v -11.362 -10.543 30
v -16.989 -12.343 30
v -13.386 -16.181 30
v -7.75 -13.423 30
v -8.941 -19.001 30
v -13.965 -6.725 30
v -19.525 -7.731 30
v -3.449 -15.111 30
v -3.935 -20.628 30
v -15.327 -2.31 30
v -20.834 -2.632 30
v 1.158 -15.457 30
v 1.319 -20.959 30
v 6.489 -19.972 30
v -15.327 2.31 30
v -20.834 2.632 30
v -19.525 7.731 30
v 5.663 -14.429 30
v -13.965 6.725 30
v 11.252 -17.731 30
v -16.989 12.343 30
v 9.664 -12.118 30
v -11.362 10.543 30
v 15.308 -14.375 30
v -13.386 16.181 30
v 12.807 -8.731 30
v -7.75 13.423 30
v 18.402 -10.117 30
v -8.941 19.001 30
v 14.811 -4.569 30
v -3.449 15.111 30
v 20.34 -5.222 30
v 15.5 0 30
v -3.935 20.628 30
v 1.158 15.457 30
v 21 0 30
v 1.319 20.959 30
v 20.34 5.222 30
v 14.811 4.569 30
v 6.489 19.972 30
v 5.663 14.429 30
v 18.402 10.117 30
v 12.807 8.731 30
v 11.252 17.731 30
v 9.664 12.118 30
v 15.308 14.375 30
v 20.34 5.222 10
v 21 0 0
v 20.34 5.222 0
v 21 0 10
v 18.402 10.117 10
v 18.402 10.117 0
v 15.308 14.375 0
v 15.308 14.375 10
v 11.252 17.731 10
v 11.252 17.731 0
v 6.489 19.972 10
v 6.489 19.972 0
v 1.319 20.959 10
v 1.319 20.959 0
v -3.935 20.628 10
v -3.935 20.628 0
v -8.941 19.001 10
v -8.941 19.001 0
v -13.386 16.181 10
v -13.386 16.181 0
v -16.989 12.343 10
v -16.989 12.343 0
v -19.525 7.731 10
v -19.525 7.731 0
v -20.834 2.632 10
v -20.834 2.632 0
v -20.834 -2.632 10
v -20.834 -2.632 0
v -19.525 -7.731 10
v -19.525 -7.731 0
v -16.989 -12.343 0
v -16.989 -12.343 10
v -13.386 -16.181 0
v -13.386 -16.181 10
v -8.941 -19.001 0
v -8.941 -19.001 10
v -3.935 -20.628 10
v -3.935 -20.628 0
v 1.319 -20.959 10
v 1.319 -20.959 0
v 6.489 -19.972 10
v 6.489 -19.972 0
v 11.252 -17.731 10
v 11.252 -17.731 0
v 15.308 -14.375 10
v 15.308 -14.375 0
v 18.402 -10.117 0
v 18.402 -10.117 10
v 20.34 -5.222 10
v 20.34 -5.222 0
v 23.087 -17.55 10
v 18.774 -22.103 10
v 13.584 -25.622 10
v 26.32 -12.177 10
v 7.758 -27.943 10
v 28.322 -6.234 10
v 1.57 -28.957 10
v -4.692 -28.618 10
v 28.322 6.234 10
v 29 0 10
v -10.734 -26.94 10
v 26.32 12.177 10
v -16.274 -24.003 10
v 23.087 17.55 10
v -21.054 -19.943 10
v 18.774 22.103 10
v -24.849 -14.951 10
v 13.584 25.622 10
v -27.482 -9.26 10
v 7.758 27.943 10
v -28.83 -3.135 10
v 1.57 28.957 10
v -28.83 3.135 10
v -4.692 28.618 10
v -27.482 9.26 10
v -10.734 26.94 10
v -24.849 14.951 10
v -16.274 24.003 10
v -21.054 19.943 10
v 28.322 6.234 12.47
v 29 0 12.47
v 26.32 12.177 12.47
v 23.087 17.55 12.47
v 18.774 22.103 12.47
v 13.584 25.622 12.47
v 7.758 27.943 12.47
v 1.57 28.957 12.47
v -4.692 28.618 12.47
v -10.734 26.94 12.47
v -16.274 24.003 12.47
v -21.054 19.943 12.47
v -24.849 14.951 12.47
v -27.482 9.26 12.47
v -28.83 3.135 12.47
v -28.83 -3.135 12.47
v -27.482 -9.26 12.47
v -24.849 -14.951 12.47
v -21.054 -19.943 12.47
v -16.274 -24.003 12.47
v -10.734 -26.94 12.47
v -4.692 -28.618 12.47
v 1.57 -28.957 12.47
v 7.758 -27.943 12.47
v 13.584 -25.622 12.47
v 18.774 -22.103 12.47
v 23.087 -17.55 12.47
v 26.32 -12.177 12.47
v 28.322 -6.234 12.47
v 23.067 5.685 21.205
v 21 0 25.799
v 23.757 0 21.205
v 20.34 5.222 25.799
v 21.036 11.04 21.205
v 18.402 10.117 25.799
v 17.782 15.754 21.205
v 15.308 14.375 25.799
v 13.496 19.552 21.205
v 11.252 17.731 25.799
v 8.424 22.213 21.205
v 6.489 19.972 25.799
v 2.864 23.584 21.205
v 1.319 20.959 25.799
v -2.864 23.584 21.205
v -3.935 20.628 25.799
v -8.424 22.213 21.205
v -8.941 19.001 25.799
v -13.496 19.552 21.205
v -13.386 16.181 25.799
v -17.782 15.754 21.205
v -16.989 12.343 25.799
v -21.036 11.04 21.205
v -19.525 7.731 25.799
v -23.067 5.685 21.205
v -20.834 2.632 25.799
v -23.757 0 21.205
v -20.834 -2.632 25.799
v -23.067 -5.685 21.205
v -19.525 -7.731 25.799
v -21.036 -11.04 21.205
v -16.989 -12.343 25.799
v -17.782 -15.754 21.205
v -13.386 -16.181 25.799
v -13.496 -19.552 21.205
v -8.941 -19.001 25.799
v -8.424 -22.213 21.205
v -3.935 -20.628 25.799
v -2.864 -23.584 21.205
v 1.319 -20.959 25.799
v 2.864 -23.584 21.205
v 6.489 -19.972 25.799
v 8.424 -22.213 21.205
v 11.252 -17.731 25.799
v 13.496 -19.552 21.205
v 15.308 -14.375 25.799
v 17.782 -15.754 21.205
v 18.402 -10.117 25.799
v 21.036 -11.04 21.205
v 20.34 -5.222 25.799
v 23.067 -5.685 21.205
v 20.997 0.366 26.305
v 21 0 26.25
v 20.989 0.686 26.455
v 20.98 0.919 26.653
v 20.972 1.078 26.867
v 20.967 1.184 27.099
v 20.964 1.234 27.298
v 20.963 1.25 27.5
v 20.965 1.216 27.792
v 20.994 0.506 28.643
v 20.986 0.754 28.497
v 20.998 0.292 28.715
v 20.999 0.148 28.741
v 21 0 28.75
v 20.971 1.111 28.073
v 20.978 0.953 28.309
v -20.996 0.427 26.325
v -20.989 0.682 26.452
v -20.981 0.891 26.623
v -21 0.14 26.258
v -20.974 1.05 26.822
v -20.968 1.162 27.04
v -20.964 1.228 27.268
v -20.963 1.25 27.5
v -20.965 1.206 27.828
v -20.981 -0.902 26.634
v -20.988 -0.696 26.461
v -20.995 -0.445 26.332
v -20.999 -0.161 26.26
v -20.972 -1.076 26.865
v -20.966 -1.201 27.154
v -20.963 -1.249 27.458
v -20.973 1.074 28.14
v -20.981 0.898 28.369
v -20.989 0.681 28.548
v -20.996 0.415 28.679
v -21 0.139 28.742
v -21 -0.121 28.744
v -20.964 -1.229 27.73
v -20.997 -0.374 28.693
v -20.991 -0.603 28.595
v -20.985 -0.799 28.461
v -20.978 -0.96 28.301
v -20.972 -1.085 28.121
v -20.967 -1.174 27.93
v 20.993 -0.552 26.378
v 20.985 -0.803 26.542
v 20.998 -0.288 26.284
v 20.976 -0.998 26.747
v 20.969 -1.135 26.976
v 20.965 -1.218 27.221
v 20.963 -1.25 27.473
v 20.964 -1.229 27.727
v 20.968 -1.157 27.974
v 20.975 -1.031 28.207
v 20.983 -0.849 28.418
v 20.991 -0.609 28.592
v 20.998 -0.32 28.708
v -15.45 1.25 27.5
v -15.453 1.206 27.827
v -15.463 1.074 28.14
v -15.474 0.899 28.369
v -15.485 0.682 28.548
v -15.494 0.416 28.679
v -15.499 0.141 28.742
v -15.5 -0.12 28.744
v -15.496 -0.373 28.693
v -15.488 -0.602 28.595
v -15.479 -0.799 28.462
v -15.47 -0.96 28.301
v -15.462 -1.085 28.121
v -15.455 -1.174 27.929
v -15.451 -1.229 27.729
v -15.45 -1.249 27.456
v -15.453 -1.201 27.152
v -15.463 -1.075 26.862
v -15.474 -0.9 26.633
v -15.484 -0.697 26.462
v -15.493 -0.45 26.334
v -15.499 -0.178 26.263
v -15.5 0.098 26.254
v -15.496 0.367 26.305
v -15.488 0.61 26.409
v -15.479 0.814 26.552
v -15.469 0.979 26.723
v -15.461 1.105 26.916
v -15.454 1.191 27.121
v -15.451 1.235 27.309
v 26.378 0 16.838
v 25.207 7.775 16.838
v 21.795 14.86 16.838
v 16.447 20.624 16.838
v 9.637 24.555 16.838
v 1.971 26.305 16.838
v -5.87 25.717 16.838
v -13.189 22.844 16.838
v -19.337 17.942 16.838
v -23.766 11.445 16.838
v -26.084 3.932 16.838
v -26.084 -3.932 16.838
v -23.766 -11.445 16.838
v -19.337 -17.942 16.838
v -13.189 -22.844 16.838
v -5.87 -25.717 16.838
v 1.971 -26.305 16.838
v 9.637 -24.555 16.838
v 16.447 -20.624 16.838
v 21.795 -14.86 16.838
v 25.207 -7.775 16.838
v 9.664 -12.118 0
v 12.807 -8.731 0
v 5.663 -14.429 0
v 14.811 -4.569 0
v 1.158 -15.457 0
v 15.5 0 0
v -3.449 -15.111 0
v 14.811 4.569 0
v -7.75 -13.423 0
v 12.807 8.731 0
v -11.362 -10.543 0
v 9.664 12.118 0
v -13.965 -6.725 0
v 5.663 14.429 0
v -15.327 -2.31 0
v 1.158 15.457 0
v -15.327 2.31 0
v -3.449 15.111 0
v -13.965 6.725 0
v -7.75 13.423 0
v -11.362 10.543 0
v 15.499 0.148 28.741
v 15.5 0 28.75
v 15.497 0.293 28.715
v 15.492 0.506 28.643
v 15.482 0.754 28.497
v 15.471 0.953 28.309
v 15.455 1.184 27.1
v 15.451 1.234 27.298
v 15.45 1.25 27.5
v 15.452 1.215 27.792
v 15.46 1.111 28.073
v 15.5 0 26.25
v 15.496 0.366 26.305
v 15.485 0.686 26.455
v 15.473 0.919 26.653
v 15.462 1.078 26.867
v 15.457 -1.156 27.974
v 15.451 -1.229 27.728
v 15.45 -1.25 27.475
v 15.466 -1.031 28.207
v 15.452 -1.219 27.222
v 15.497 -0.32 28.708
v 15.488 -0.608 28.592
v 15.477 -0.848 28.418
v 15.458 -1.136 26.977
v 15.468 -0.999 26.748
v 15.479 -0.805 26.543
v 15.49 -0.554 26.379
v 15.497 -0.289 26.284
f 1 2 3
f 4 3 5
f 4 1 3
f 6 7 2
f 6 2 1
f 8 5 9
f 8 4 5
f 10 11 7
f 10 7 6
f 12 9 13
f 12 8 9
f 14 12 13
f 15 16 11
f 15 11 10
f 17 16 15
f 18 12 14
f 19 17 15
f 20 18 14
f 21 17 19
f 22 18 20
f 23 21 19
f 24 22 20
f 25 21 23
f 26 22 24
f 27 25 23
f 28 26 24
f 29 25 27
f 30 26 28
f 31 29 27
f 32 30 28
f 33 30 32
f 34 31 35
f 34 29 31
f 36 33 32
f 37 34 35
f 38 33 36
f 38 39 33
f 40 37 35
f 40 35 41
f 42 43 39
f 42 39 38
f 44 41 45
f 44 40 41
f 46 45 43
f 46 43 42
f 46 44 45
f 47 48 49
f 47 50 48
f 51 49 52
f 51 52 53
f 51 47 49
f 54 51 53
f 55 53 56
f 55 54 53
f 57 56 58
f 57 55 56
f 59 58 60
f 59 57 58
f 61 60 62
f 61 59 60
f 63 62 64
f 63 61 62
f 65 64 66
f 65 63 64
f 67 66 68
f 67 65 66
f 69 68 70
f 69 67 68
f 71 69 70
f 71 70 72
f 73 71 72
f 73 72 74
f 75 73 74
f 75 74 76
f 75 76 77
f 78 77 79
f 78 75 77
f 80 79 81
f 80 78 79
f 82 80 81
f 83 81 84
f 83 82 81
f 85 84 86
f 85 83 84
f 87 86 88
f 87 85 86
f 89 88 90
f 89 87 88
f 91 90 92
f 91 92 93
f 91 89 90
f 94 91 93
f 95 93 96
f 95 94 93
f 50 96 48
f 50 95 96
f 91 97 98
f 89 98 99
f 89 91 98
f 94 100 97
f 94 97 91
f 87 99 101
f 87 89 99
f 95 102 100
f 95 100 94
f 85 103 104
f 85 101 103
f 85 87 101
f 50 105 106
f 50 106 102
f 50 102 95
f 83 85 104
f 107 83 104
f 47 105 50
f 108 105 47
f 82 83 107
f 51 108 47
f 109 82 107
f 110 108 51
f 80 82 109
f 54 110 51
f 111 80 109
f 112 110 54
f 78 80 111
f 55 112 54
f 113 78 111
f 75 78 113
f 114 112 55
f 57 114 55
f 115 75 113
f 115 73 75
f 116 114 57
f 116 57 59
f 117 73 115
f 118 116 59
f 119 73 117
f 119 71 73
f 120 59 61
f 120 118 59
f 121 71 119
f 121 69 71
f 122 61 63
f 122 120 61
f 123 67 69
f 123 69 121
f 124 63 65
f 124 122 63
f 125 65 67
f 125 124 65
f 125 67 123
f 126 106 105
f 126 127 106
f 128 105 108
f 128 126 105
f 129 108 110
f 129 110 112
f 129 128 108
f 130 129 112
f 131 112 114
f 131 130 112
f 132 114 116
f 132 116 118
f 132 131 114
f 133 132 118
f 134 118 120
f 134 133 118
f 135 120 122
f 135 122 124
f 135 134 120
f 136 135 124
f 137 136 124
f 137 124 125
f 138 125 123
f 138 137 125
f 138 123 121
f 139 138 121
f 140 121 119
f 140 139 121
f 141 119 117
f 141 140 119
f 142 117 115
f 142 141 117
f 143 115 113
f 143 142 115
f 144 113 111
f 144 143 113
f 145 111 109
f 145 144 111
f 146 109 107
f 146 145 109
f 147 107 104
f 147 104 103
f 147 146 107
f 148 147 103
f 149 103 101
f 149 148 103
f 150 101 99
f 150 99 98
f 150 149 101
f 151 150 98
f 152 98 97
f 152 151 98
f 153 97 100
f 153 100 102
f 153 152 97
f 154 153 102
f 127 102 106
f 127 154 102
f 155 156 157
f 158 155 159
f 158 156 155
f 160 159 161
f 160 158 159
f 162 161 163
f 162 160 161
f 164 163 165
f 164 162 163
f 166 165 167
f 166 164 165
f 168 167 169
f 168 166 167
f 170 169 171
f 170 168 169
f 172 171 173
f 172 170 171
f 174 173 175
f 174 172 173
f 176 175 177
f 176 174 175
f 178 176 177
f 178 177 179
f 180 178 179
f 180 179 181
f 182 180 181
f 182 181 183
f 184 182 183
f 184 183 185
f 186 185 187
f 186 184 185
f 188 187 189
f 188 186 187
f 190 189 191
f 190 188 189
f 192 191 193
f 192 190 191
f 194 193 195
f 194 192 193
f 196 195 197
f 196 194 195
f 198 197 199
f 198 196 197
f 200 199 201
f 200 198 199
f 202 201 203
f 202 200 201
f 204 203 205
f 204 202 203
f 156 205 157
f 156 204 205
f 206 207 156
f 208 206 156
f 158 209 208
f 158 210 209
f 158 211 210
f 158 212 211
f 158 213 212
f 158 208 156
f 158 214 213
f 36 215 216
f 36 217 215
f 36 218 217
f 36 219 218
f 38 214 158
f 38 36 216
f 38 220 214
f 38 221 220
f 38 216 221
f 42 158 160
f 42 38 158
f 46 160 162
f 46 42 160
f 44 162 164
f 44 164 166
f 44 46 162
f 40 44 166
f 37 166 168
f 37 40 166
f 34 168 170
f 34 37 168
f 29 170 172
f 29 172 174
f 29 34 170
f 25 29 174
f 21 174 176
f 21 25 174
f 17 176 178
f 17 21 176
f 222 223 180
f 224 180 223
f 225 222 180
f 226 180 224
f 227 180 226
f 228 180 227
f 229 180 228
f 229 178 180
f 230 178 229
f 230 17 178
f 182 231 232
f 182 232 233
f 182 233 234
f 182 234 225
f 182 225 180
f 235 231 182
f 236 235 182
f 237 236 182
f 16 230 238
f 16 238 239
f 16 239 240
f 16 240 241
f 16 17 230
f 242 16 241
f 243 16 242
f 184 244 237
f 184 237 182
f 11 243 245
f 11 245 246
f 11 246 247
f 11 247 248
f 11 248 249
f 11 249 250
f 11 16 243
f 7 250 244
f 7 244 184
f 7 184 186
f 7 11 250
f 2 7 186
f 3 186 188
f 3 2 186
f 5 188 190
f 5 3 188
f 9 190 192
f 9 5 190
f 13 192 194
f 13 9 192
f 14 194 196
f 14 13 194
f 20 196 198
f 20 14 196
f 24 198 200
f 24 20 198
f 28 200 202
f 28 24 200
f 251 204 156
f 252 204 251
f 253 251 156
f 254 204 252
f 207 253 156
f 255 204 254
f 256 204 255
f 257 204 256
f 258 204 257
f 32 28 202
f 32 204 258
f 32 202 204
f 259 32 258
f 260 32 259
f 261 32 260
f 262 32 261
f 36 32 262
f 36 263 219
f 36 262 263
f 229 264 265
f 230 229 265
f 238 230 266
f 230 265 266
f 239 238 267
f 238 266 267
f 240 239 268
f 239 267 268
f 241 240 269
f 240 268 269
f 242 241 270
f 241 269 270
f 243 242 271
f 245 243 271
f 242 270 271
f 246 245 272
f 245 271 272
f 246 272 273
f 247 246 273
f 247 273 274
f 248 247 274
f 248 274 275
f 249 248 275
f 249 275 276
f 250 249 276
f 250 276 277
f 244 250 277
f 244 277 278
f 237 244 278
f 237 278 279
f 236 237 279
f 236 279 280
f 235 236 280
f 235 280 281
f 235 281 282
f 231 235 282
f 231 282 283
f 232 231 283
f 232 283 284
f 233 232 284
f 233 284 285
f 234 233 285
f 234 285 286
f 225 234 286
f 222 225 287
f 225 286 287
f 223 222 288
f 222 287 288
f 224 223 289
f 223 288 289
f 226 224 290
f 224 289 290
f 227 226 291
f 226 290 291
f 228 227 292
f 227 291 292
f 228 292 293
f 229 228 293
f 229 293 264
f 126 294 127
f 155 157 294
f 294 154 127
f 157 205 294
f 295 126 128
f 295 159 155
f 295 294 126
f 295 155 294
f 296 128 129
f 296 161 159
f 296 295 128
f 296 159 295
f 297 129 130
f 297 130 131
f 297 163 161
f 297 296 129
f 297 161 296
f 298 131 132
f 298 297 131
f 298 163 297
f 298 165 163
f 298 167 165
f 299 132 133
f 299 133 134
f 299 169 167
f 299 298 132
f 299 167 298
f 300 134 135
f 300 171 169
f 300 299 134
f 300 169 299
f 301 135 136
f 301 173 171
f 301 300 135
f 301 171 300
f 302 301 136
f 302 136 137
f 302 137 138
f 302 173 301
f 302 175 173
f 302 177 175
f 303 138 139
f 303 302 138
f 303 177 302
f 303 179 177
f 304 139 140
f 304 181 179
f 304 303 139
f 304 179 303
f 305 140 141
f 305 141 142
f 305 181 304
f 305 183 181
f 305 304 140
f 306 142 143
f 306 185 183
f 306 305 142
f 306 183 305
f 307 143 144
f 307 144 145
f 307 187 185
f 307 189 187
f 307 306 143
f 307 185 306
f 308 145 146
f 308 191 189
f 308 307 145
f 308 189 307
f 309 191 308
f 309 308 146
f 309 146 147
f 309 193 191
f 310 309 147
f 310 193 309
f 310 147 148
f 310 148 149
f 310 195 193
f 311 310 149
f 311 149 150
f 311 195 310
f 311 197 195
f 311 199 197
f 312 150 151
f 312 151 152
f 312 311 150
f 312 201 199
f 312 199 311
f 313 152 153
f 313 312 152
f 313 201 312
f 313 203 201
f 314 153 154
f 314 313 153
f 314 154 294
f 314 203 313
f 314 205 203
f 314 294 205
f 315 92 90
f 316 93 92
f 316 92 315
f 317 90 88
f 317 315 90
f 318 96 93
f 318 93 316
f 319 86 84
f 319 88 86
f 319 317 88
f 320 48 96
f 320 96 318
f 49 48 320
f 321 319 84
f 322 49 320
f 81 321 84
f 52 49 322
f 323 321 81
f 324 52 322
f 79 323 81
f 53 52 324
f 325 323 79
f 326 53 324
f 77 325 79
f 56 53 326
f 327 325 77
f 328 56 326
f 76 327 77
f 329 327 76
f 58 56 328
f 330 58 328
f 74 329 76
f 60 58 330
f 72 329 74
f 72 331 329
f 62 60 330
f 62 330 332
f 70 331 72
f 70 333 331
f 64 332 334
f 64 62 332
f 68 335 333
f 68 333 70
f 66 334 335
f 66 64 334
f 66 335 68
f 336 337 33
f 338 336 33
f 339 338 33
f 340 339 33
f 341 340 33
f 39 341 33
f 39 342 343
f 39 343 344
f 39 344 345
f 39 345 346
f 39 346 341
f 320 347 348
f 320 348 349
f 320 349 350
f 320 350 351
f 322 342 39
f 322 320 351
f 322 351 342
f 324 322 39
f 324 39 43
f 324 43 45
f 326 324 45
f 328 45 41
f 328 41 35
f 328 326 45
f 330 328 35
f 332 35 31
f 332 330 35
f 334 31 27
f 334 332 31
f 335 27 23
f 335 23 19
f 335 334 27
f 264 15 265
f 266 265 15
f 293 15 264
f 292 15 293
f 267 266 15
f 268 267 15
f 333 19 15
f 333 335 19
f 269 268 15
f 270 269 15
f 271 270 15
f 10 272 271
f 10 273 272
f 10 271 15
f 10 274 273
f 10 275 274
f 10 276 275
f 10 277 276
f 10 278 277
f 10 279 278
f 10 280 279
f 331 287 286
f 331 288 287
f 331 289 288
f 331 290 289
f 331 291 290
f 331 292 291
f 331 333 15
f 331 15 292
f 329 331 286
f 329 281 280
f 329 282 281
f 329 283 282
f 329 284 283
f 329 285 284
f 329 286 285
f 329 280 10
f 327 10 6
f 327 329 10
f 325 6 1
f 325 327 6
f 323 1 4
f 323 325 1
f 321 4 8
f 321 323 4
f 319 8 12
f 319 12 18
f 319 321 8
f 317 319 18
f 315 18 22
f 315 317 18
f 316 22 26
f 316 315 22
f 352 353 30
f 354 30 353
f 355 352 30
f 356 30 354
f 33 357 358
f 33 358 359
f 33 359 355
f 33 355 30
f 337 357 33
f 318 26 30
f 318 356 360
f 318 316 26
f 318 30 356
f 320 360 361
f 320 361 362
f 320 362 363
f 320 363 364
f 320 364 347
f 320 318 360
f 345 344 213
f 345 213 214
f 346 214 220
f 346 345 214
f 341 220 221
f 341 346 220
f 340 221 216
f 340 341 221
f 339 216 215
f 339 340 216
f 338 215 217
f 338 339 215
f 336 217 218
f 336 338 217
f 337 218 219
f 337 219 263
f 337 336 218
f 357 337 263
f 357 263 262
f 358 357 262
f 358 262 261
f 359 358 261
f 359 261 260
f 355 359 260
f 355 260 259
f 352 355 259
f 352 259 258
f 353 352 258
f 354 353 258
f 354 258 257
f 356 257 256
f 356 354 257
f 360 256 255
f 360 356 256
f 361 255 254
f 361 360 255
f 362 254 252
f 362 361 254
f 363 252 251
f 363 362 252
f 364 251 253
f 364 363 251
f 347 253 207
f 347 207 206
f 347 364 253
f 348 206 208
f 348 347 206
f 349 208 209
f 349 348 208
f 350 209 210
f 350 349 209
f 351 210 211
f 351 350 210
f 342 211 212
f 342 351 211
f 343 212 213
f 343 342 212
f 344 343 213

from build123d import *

# Parameters (mm, degrees)
F2_R          = 1.25
F3_DEPTH      = 29.001
F3_DEPTH_BACK = 25


with BuildPart() as f1:
    # F0 (on Front) → F1 (revolve)
    with BuildSketch(Plane.XZ):
        Polygon((21, 21.2053321302), (21, 10), (29, 10), (29, 12.4697282932), (23.756984706, 21.2053321302), align=None)
        Polygon((21, 25.7988579593), (21, 21.2053321302), (23.756984706, 21.2053321302), align=None)
        Polygon((15.5, 30), (15.5, 0), (21, 0), (21, 10), (21, 21.2053321302), (21, 25.7988579593), (21, 30), align=None)
    revolve(axis=Axis((0, 0, 17.8434439003), (0, 0, 1)))

    # F2 (on Right) → F3 (cut, two sides)
    with BuildSketch(Plane.YZ) as f3_sk:
        with Locations((0, 27.5)):
            Circle(F2_R)
    extrude(amount=-F3_DEPTH, mode=Mode.SUBTRACT)
    extrude(f3_sk.sketch, amount=F3_DEPTH_BACK, mode=Mode.SUBTRACT)


solid = f1.part
